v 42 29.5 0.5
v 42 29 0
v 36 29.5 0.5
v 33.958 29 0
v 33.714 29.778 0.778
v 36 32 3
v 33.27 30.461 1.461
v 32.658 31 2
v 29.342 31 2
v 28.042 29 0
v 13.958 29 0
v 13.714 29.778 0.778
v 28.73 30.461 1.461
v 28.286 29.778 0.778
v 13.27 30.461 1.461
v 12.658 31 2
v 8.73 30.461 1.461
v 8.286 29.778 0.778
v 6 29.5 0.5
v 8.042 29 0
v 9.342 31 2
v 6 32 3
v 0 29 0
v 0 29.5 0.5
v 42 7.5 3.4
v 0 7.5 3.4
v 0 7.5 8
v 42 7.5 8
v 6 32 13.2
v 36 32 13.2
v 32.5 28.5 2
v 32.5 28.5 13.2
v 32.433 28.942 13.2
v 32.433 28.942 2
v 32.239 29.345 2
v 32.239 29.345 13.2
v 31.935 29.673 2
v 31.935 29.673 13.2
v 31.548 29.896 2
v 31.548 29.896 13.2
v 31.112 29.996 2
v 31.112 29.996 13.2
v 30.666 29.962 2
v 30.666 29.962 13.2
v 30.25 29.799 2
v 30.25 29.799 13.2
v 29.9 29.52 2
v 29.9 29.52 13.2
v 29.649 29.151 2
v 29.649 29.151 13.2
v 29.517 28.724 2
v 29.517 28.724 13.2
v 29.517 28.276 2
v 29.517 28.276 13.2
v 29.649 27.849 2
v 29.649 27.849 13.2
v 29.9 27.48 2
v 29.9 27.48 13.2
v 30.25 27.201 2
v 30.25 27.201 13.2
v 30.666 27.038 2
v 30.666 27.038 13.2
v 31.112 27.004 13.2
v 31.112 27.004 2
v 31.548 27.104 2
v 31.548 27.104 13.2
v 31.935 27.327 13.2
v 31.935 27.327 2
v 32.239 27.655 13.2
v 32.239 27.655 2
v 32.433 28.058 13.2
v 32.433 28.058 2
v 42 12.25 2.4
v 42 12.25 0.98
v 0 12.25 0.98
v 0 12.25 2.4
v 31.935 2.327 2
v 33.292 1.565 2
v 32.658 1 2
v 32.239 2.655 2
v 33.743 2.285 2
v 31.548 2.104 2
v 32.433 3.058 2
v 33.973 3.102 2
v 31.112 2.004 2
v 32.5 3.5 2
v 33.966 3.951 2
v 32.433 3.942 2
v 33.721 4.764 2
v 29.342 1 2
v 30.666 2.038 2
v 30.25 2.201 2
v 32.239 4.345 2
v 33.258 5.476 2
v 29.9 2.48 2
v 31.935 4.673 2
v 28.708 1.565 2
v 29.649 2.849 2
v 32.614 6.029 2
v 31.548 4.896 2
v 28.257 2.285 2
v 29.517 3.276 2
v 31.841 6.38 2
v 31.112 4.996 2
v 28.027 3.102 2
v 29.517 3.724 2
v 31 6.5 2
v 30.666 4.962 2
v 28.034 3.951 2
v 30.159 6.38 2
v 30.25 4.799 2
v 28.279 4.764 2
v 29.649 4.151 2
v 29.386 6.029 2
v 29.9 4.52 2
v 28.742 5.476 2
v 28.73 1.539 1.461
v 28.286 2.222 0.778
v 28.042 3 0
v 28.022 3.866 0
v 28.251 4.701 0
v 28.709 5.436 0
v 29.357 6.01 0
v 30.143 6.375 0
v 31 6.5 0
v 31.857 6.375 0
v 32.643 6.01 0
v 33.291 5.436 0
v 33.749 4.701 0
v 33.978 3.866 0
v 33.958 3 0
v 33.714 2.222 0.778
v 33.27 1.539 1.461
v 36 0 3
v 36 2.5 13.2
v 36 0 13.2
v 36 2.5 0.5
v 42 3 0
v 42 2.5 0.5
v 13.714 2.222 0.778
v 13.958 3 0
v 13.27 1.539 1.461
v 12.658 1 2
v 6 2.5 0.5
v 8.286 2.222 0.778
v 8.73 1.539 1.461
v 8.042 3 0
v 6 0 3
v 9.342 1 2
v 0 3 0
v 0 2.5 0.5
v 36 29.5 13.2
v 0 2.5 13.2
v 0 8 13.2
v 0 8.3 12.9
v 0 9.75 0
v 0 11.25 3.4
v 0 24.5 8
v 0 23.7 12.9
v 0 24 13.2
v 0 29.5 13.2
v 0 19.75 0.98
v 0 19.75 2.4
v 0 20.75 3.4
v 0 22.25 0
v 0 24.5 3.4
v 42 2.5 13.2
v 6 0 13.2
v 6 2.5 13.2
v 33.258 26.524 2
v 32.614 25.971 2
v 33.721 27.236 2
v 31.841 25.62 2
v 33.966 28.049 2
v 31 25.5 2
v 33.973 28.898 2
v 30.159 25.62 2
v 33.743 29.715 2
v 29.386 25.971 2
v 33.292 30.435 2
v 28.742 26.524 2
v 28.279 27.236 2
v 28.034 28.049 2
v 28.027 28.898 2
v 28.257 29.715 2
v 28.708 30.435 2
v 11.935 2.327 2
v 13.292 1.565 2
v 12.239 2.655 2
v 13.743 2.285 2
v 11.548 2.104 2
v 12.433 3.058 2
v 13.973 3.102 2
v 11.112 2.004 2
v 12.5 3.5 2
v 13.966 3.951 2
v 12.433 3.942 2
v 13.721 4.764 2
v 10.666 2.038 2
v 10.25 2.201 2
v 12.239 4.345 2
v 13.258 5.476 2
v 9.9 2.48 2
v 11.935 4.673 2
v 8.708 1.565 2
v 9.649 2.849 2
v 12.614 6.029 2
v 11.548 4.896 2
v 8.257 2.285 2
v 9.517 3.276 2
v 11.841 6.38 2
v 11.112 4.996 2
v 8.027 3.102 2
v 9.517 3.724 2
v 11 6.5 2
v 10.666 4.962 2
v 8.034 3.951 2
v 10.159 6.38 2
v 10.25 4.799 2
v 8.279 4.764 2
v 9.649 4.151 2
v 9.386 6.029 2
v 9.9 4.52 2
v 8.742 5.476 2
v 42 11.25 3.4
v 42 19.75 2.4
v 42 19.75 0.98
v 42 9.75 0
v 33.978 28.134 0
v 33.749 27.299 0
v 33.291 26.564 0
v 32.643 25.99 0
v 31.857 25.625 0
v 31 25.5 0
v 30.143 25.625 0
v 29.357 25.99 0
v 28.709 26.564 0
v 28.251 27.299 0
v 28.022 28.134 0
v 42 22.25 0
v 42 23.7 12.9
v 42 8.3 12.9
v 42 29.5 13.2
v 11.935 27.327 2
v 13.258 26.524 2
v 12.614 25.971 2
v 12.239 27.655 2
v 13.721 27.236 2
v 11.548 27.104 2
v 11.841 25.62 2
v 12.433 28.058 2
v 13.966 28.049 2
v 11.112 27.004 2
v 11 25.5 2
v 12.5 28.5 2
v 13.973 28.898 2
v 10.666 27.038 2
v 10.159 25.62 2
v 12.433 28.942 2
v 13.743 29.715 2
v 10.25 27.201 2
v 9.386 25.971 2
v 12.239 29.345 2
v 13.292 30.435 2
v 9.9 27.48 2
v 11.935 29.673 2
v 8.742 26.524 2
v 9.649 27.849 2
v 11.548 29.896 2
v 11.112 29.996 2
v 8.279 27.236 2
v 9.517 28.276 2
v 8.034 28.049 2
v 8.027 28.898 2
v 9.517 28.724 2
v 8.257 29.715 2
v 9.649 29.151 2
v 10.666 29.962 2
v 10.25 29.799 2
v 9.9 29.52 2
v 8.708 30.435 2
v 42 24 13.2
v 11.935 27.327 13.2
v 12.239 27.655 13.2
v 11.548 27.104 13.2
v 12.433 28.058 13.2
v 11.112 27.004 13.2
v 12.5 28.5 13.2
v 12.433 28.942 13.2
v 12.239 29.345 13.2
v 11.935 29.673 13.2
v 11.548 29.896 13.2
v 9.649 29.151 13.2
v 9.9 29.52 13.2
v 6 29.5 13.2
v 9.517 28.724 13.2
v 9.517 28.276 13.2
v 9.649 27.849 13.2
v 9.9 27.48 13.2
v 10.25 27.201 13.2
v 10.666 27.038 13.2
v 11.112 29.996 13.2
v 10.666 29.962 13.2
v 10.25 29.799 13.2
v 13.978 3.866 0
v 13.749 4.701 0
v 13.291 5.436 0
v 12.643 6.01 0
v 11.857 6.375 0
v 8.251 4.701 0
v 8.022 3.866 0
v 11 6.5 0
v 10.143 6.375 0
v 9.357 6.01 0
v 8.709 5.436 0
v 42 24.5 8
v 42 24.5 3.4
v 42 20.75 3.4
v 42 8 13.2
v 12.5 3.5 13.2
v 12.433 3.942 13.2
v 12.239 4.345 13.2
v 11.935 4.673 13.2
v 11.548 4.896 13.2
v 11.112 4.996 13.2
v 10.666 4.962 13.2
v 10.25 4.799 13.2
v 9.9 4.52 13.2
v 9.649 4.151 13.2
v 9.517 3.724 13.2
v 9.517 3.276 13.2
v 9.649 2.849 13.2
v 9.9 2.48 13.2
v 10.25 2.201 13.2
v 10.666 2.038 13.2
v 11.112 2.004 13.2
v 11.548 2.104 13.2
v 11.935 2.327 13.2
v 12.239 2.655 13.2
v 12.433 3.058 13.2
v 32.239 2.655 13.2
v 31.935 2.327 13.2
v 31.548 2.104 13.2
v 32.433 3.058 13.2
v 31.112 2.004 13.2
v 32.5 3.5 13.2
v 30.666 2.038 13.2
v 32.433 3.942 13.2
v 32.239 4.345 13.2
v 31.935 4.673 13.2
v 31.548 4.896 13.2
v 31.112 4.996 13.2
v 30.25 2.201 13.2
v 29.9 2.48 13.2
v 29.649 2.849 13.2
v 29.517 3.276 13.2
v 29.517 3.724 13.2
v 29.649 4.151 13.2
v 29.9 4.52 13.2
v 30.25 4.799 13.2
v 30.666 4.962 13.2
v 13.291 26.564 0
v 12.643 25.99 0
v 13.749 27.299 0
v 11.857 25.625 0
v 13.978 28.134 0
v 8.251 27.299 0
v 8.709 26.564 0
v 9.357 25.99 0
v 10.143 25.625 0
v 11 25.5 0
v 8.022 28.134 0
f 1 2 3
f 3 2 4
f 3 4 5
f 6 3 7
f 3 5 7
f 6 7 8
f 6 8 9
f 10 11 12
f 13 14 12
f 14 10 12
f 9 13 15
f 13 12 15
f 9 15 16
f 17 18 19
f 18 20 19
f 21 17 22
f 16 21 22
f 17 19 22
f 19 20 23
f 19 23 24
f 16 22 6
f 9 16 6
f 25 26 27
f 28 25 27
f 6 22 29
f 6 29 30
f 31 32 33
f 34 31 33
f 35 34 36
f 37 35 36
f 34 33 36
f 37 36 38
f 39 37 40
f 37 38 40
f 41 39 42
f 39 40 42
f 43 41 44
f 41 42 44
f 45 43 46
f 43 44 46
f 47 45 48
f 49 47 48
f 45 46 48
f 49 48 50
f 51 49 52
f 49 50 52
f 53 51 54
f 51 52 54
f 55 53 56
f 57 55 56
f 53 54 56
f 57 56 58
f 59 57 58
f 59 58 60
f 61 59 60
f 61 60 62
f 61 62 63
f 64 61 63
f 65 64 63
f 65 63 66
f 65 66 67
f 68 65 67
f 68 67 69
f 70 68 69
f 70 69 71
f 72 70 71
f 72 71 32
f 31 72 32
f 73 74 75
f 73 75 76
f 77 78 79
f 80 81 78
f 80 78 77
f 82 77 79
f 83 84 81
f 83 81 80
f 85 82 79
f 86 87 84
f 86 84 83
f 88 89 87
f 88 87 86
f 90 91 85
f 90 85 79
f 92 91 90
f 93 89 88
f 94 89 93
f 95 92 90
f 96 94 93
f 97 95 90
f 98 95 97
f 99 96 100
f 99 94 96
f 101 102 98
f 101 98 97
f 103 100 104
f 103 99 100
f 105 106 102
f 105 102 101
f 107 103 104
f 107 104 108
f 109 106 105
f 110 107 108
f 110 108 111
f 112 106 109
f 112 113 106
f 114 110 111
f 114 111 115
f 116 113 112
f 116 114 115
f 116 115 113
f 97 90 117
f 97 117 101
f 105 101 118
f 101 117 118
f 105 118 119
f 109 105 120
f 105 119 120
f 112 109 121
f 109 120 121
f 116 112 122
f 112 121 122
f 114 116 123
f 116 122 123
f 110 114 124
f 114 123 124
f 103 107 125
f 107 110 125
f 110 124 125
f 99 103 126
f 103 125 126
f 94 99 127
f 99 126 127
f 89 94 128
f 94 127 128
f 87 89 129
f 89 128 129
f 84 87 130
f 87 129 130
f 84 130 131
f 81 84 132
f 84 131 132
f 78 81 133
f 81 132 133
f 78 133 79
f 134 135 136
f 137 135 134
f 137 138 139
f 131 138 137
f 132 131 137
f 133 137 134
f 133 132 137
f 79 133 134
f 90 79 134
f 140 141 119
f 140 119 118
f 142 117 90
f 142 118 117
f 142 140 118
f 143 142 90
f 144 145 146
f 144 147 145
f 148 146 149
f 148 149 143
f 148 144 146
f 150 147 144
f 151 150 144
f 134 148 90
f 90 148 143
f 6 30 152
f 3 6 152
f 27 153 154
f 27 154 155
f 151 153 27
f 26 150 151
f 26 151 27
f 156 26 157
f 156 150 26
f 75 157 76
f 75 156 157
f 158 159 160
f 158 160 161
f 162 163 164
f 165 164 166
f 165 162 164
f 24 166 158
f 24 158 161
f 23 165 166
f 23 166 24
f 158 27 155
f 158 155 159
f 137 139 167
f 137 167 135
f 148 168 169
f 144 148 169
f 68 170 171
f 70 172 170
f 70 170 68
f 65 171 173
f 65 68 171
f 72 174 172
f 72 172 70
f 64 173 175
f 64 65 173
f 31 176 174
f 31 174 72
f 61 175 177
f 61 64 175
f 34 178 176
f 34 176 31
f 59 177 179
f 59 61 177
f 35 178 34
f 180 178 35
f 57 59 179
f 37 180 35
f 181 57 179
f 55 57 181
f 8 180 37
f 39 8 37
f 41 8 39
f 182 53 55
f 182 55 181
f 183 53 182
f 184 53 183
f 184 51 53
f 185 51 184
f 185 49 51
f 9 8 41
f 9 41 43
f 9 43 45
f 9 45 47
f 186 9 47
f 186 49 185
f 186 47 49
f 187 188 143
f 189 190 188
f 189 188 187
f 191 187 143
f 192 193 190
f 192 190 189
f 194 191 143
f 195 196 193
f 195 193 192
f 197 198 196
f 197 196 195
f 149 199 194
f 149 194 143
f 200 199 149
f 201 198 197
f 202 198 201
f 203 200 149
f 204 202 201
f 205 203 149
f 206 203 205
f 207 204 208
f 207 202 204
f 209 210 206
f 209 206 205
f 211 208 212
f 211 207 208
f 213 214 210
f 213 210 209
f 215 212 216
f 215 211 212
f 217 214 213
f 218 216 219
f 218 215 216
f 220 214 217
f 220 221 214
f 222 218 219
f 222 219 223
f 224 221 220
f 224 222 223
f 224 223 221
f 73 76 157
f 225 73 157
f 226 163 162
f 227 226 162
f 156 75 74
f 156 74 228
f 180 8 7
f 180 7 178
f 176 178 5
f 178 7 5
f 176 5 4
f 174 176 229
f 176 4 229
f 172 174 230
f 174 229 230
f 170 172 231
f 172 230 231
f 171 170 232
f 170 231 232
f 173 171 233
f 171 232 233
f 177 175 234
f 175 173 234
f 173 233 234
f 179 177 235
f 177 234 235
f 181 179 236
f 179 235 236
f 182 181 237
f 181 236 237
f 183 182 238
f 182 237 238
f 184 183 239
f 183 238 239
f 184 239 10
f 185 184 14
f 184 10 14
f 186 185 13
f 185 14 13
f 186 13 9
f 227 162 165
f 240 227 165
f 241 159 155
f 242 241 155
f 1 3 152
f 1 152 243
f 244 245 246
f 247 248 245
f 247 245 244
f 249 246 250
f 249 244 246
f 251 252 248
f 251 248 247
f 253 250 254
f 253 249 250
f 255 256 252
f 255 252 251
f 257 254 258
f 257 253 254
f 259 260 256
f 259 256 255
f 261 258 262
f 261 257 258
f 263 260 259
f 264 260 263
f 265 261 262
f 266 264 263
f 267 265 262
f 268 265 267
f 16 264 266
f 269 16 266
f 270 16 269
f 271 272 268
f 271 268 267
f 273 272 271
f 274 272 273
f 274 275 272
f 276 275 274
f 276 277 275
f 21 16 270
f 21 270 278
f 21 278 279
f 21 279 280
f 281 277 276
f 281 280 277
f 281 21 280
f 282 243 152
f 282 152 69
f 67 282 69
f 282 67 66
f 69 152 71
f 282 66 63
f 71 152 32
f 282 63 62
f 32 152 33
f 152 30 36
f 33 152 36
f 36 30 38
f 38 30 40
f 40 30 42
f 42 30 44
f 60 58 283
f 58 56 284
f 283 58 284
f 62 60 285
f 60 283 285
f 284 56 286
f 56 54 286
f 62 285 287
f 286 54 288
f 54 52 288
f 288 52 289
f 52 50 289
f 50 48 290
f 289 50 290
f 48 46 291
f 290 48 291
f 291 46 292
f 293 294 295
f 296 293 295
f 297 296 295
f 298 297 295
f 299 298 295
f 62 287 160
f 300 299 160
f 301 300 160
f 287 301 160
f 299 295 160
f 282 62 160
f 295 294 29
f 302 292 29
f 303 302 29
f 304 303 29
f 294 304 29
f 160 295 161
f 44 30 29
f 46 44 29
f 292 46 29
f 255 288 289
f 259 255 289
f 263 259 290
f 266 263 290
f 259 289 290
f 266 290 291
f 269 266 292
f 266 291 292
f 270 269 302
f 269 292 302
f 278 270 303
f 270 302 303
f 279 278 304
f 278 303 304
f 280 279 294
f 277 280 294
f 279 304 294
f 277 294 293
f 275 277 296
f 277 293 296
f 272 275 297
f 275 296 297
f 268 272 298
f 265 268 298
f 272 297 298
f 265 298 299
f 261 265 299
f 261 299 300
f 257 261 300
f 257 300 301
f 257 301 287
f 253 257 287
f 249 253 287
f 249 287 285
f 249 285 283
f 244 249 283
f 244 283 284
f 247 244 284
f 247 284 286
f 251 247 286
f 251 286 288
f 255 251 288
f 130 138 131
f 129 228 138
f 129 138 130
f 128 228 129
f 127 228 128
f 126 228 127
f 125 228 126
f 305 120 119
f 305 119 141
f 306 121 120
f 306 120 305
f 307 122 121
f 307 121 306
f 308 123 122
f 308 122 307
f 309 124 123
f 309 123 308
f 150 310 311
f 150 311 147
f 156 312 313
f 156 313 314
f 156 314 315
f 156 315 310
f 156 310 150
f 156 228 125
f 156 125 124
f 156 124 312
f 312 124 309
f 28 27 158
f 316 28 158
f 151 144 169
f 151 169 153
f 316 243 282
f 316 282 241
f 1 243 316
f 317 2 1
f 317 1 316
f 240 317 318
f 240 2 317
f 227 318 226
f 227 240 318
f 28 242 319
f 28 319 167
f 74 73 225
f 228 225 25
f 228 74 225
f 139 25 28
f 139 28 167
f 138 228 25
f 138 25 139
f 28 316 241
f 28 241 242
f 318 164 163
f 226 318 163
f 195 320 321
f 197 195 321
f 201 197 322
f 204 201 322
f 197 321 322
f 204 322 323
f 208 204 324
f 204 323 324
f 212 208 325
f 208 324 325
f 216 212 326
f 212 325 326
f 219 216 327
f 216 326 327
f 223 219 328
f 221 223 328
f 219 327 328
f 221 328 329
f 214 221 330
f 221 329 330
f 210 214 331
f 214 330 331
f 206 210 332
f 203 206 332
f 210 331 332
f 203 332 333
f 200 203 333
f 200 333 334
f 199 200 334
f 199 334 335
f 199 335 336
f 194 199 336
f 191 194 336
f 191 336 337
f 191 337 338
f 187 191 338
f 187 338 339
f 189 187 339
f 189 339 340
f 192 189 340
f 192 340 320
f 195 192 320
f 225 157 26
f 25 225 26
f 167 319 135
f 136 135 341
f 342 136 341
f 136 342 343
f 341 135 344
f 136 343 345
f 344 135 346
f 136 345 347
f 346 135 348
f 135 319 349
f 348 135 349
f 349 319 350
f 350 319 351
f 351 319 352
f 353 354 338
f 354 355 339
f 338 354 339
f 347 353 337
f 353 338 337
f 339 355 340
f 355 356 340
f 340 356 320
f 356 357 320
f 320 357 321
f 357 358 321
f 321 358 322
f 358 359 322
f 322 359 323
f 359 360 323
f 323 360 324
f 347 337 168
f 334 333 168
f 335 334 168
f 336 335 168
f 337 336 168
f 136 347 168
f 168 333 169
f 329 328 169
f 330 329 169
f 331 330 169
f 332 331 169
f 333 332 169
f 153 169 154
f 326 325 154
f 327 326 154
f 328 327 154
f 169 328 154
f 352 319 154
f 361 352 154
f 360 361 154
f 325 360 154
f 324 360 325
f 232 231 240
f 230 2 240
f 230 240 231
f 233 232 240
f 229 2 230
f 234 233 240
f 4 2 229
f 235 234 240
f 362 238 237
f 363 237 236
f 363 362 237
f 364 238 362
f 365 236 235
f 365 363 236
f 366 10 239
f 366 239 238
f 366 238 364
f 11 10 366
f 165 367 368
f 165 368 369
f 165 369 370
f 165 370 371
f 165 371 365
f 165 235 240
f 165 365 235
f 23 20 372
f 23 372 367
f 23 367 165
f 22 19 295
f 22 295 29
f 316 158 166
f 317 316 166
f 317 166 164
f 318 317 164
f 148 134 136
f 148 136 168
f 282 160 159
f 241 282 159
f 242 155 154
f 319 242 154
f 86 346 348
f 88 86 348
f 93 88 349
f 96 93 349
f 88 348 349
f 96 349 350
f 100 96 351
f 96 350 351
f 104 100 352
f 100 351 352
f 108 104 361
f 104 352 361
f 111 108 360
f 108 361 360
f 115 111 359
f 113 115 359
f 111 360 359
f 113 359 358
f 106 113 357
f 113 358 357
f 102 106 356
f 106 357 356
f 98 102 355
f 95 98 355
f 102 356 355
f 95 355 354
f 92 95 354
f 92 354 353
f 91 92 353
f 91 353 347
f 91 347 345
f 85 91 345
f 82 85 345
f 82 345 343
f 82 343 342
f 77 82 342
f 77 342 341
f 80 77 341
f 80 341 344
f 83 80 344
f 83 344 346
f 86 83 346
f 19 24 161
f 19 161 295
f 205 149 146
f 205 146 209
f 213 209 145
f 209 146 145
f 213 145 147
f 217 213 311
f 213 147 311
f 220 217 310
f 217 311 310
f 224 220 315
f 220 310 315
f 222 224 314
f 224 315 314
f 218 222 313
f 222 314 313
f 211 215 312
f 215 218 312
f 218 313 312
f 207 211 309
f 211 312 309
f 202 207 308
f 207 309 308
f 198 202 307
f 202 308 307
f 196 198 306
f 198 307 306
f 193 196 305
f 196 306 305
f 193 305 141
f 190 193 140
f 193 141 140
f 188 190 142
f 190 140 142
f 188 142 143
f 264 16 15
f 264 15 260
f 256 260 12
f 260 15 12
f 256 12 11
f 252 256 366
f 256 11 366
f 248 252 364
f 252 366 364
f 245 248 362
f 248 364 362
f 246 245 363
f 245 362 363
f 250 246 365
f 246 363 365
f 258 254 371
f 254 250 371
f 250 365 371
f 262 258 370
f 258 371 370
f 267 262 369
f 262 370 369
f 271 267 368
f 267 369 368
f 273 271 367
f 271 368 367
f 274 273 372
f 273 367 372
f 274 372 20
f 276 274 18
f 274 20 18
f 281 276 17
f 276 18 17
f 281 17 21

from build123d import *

# Parameters (mm, degrees)
BOSS_EXTRUDE1_DEPTH = 13.2
CUT_EXTRUDE4_DEPTH  = 55.426464151
CUT_EXTRUDE5_DEPTH  = 55.426464151
SKETCH5_R           = 1.5
CUT_EXTRUDE6_DEPTH  = 55.426464151
SKETCH6_R           = 3
CUT_EXTRUDE7_DEPTH  = 2


with BuildPart() as part:
    # Sketch1 → Boss-Extrude1 (new body)
    with BuildSketch(Plane.XY):
        Polygon((0, 29.5), (6, 29.5), (6, 32), (36, 32), (36, 29.5), (42, 29.5), (42, 2.5), (36, 2.5), (36, 0), (6, 0), (6, 2.5), (0, 2.5), align=None)
    extrude(amount=BOSS_EXTRUDE1_DEPTH)

    # Sketch3 → Cut-Extrude4 (cut, through all)
    with BuildSketch(Plane(origin=(0, 0, 0), x_dir=(0, 0, -1), z_dir=(1, 0, 0))):
        Polygon((-2.4, 19.75), (0, 19.75), (0, 12.25), (-2.4, 12.25), (-3.4, 11.25), (-3.4, 7.5), (-8, 7.5), (-8, 24.5), (-3.4, 24.5), (-3.4, 20.75), align=None)
    extrude(amount=CUT_EXTRUDE4_DEPTH, mode=Mode.SUBTRACT)

    # Sketch4 → Cut-Extrude5 (cut, through all)
    with BuildSketch(Plane(origin=(0, 0, 0), x_dir=(0, 0, -1), z_dir=(1, 0, 0))):
        Polygon((-13.2, 24), (-12.9, 23.7), (-12.9, 8.3), (-13.2, 8), align=None)
        Polygon((0, 3), (-3, 0), (0, 0), align=None)
        Polygon((0, 32), (0, 29), (-3, 32), align=None)
        Polygon((-0.98, 12.25), (0, 9.75), (0, 12.25), align=None)
        Polygon((-0.98, 19.75), (0, 22.25), (0, 19.75), align=None)
    extrude(amount=CUT_EXTRUDE5_DEPTH, mode=Mode.SUBTRACT)

    # Sketch5 → Cut-Extrude6 (cut, through all)
    with BuildSketch(Plane.XY.offset(13.2)):
        with Locations((11, 28.5)):
            Circle(SKETCH5_R)
        with Locations((31, 28.5)):
            Circle(SKETCH5_R)
        with Locations((31, 3.5)):
            Circle(SKETCH5_R)
        with Locations((11, 3.5)):
            Circle(SKETCH5_R)
    extrude(amount=-CUT_EXTRUDE6_DEPTH, mode=Mode.SUBTRACT)

    # Sketch6 → Cut-Extrude7 (cut)
    with BuildSketch(Plane(origin=(0, 0, 0), x_dir=(-1, 0, 0), z_dir=(0, 0, -1))):
        with Locations((-31, 28.5)):
            Circle(SKETCH6_R)
        with Locations((-11, 28.5)):
            Circle(SKETCH6_R)
        with Locations((-11, 3.5)):
            Circle(SKETCH6_R)
        with Locations((-31, 3.5)):
            Circle(SKETCH6_R)
    extrude(amount=-CUT_EXTRUDE7_DEPTH, mode=Mode.SUBTRACT)


solid = part.part
